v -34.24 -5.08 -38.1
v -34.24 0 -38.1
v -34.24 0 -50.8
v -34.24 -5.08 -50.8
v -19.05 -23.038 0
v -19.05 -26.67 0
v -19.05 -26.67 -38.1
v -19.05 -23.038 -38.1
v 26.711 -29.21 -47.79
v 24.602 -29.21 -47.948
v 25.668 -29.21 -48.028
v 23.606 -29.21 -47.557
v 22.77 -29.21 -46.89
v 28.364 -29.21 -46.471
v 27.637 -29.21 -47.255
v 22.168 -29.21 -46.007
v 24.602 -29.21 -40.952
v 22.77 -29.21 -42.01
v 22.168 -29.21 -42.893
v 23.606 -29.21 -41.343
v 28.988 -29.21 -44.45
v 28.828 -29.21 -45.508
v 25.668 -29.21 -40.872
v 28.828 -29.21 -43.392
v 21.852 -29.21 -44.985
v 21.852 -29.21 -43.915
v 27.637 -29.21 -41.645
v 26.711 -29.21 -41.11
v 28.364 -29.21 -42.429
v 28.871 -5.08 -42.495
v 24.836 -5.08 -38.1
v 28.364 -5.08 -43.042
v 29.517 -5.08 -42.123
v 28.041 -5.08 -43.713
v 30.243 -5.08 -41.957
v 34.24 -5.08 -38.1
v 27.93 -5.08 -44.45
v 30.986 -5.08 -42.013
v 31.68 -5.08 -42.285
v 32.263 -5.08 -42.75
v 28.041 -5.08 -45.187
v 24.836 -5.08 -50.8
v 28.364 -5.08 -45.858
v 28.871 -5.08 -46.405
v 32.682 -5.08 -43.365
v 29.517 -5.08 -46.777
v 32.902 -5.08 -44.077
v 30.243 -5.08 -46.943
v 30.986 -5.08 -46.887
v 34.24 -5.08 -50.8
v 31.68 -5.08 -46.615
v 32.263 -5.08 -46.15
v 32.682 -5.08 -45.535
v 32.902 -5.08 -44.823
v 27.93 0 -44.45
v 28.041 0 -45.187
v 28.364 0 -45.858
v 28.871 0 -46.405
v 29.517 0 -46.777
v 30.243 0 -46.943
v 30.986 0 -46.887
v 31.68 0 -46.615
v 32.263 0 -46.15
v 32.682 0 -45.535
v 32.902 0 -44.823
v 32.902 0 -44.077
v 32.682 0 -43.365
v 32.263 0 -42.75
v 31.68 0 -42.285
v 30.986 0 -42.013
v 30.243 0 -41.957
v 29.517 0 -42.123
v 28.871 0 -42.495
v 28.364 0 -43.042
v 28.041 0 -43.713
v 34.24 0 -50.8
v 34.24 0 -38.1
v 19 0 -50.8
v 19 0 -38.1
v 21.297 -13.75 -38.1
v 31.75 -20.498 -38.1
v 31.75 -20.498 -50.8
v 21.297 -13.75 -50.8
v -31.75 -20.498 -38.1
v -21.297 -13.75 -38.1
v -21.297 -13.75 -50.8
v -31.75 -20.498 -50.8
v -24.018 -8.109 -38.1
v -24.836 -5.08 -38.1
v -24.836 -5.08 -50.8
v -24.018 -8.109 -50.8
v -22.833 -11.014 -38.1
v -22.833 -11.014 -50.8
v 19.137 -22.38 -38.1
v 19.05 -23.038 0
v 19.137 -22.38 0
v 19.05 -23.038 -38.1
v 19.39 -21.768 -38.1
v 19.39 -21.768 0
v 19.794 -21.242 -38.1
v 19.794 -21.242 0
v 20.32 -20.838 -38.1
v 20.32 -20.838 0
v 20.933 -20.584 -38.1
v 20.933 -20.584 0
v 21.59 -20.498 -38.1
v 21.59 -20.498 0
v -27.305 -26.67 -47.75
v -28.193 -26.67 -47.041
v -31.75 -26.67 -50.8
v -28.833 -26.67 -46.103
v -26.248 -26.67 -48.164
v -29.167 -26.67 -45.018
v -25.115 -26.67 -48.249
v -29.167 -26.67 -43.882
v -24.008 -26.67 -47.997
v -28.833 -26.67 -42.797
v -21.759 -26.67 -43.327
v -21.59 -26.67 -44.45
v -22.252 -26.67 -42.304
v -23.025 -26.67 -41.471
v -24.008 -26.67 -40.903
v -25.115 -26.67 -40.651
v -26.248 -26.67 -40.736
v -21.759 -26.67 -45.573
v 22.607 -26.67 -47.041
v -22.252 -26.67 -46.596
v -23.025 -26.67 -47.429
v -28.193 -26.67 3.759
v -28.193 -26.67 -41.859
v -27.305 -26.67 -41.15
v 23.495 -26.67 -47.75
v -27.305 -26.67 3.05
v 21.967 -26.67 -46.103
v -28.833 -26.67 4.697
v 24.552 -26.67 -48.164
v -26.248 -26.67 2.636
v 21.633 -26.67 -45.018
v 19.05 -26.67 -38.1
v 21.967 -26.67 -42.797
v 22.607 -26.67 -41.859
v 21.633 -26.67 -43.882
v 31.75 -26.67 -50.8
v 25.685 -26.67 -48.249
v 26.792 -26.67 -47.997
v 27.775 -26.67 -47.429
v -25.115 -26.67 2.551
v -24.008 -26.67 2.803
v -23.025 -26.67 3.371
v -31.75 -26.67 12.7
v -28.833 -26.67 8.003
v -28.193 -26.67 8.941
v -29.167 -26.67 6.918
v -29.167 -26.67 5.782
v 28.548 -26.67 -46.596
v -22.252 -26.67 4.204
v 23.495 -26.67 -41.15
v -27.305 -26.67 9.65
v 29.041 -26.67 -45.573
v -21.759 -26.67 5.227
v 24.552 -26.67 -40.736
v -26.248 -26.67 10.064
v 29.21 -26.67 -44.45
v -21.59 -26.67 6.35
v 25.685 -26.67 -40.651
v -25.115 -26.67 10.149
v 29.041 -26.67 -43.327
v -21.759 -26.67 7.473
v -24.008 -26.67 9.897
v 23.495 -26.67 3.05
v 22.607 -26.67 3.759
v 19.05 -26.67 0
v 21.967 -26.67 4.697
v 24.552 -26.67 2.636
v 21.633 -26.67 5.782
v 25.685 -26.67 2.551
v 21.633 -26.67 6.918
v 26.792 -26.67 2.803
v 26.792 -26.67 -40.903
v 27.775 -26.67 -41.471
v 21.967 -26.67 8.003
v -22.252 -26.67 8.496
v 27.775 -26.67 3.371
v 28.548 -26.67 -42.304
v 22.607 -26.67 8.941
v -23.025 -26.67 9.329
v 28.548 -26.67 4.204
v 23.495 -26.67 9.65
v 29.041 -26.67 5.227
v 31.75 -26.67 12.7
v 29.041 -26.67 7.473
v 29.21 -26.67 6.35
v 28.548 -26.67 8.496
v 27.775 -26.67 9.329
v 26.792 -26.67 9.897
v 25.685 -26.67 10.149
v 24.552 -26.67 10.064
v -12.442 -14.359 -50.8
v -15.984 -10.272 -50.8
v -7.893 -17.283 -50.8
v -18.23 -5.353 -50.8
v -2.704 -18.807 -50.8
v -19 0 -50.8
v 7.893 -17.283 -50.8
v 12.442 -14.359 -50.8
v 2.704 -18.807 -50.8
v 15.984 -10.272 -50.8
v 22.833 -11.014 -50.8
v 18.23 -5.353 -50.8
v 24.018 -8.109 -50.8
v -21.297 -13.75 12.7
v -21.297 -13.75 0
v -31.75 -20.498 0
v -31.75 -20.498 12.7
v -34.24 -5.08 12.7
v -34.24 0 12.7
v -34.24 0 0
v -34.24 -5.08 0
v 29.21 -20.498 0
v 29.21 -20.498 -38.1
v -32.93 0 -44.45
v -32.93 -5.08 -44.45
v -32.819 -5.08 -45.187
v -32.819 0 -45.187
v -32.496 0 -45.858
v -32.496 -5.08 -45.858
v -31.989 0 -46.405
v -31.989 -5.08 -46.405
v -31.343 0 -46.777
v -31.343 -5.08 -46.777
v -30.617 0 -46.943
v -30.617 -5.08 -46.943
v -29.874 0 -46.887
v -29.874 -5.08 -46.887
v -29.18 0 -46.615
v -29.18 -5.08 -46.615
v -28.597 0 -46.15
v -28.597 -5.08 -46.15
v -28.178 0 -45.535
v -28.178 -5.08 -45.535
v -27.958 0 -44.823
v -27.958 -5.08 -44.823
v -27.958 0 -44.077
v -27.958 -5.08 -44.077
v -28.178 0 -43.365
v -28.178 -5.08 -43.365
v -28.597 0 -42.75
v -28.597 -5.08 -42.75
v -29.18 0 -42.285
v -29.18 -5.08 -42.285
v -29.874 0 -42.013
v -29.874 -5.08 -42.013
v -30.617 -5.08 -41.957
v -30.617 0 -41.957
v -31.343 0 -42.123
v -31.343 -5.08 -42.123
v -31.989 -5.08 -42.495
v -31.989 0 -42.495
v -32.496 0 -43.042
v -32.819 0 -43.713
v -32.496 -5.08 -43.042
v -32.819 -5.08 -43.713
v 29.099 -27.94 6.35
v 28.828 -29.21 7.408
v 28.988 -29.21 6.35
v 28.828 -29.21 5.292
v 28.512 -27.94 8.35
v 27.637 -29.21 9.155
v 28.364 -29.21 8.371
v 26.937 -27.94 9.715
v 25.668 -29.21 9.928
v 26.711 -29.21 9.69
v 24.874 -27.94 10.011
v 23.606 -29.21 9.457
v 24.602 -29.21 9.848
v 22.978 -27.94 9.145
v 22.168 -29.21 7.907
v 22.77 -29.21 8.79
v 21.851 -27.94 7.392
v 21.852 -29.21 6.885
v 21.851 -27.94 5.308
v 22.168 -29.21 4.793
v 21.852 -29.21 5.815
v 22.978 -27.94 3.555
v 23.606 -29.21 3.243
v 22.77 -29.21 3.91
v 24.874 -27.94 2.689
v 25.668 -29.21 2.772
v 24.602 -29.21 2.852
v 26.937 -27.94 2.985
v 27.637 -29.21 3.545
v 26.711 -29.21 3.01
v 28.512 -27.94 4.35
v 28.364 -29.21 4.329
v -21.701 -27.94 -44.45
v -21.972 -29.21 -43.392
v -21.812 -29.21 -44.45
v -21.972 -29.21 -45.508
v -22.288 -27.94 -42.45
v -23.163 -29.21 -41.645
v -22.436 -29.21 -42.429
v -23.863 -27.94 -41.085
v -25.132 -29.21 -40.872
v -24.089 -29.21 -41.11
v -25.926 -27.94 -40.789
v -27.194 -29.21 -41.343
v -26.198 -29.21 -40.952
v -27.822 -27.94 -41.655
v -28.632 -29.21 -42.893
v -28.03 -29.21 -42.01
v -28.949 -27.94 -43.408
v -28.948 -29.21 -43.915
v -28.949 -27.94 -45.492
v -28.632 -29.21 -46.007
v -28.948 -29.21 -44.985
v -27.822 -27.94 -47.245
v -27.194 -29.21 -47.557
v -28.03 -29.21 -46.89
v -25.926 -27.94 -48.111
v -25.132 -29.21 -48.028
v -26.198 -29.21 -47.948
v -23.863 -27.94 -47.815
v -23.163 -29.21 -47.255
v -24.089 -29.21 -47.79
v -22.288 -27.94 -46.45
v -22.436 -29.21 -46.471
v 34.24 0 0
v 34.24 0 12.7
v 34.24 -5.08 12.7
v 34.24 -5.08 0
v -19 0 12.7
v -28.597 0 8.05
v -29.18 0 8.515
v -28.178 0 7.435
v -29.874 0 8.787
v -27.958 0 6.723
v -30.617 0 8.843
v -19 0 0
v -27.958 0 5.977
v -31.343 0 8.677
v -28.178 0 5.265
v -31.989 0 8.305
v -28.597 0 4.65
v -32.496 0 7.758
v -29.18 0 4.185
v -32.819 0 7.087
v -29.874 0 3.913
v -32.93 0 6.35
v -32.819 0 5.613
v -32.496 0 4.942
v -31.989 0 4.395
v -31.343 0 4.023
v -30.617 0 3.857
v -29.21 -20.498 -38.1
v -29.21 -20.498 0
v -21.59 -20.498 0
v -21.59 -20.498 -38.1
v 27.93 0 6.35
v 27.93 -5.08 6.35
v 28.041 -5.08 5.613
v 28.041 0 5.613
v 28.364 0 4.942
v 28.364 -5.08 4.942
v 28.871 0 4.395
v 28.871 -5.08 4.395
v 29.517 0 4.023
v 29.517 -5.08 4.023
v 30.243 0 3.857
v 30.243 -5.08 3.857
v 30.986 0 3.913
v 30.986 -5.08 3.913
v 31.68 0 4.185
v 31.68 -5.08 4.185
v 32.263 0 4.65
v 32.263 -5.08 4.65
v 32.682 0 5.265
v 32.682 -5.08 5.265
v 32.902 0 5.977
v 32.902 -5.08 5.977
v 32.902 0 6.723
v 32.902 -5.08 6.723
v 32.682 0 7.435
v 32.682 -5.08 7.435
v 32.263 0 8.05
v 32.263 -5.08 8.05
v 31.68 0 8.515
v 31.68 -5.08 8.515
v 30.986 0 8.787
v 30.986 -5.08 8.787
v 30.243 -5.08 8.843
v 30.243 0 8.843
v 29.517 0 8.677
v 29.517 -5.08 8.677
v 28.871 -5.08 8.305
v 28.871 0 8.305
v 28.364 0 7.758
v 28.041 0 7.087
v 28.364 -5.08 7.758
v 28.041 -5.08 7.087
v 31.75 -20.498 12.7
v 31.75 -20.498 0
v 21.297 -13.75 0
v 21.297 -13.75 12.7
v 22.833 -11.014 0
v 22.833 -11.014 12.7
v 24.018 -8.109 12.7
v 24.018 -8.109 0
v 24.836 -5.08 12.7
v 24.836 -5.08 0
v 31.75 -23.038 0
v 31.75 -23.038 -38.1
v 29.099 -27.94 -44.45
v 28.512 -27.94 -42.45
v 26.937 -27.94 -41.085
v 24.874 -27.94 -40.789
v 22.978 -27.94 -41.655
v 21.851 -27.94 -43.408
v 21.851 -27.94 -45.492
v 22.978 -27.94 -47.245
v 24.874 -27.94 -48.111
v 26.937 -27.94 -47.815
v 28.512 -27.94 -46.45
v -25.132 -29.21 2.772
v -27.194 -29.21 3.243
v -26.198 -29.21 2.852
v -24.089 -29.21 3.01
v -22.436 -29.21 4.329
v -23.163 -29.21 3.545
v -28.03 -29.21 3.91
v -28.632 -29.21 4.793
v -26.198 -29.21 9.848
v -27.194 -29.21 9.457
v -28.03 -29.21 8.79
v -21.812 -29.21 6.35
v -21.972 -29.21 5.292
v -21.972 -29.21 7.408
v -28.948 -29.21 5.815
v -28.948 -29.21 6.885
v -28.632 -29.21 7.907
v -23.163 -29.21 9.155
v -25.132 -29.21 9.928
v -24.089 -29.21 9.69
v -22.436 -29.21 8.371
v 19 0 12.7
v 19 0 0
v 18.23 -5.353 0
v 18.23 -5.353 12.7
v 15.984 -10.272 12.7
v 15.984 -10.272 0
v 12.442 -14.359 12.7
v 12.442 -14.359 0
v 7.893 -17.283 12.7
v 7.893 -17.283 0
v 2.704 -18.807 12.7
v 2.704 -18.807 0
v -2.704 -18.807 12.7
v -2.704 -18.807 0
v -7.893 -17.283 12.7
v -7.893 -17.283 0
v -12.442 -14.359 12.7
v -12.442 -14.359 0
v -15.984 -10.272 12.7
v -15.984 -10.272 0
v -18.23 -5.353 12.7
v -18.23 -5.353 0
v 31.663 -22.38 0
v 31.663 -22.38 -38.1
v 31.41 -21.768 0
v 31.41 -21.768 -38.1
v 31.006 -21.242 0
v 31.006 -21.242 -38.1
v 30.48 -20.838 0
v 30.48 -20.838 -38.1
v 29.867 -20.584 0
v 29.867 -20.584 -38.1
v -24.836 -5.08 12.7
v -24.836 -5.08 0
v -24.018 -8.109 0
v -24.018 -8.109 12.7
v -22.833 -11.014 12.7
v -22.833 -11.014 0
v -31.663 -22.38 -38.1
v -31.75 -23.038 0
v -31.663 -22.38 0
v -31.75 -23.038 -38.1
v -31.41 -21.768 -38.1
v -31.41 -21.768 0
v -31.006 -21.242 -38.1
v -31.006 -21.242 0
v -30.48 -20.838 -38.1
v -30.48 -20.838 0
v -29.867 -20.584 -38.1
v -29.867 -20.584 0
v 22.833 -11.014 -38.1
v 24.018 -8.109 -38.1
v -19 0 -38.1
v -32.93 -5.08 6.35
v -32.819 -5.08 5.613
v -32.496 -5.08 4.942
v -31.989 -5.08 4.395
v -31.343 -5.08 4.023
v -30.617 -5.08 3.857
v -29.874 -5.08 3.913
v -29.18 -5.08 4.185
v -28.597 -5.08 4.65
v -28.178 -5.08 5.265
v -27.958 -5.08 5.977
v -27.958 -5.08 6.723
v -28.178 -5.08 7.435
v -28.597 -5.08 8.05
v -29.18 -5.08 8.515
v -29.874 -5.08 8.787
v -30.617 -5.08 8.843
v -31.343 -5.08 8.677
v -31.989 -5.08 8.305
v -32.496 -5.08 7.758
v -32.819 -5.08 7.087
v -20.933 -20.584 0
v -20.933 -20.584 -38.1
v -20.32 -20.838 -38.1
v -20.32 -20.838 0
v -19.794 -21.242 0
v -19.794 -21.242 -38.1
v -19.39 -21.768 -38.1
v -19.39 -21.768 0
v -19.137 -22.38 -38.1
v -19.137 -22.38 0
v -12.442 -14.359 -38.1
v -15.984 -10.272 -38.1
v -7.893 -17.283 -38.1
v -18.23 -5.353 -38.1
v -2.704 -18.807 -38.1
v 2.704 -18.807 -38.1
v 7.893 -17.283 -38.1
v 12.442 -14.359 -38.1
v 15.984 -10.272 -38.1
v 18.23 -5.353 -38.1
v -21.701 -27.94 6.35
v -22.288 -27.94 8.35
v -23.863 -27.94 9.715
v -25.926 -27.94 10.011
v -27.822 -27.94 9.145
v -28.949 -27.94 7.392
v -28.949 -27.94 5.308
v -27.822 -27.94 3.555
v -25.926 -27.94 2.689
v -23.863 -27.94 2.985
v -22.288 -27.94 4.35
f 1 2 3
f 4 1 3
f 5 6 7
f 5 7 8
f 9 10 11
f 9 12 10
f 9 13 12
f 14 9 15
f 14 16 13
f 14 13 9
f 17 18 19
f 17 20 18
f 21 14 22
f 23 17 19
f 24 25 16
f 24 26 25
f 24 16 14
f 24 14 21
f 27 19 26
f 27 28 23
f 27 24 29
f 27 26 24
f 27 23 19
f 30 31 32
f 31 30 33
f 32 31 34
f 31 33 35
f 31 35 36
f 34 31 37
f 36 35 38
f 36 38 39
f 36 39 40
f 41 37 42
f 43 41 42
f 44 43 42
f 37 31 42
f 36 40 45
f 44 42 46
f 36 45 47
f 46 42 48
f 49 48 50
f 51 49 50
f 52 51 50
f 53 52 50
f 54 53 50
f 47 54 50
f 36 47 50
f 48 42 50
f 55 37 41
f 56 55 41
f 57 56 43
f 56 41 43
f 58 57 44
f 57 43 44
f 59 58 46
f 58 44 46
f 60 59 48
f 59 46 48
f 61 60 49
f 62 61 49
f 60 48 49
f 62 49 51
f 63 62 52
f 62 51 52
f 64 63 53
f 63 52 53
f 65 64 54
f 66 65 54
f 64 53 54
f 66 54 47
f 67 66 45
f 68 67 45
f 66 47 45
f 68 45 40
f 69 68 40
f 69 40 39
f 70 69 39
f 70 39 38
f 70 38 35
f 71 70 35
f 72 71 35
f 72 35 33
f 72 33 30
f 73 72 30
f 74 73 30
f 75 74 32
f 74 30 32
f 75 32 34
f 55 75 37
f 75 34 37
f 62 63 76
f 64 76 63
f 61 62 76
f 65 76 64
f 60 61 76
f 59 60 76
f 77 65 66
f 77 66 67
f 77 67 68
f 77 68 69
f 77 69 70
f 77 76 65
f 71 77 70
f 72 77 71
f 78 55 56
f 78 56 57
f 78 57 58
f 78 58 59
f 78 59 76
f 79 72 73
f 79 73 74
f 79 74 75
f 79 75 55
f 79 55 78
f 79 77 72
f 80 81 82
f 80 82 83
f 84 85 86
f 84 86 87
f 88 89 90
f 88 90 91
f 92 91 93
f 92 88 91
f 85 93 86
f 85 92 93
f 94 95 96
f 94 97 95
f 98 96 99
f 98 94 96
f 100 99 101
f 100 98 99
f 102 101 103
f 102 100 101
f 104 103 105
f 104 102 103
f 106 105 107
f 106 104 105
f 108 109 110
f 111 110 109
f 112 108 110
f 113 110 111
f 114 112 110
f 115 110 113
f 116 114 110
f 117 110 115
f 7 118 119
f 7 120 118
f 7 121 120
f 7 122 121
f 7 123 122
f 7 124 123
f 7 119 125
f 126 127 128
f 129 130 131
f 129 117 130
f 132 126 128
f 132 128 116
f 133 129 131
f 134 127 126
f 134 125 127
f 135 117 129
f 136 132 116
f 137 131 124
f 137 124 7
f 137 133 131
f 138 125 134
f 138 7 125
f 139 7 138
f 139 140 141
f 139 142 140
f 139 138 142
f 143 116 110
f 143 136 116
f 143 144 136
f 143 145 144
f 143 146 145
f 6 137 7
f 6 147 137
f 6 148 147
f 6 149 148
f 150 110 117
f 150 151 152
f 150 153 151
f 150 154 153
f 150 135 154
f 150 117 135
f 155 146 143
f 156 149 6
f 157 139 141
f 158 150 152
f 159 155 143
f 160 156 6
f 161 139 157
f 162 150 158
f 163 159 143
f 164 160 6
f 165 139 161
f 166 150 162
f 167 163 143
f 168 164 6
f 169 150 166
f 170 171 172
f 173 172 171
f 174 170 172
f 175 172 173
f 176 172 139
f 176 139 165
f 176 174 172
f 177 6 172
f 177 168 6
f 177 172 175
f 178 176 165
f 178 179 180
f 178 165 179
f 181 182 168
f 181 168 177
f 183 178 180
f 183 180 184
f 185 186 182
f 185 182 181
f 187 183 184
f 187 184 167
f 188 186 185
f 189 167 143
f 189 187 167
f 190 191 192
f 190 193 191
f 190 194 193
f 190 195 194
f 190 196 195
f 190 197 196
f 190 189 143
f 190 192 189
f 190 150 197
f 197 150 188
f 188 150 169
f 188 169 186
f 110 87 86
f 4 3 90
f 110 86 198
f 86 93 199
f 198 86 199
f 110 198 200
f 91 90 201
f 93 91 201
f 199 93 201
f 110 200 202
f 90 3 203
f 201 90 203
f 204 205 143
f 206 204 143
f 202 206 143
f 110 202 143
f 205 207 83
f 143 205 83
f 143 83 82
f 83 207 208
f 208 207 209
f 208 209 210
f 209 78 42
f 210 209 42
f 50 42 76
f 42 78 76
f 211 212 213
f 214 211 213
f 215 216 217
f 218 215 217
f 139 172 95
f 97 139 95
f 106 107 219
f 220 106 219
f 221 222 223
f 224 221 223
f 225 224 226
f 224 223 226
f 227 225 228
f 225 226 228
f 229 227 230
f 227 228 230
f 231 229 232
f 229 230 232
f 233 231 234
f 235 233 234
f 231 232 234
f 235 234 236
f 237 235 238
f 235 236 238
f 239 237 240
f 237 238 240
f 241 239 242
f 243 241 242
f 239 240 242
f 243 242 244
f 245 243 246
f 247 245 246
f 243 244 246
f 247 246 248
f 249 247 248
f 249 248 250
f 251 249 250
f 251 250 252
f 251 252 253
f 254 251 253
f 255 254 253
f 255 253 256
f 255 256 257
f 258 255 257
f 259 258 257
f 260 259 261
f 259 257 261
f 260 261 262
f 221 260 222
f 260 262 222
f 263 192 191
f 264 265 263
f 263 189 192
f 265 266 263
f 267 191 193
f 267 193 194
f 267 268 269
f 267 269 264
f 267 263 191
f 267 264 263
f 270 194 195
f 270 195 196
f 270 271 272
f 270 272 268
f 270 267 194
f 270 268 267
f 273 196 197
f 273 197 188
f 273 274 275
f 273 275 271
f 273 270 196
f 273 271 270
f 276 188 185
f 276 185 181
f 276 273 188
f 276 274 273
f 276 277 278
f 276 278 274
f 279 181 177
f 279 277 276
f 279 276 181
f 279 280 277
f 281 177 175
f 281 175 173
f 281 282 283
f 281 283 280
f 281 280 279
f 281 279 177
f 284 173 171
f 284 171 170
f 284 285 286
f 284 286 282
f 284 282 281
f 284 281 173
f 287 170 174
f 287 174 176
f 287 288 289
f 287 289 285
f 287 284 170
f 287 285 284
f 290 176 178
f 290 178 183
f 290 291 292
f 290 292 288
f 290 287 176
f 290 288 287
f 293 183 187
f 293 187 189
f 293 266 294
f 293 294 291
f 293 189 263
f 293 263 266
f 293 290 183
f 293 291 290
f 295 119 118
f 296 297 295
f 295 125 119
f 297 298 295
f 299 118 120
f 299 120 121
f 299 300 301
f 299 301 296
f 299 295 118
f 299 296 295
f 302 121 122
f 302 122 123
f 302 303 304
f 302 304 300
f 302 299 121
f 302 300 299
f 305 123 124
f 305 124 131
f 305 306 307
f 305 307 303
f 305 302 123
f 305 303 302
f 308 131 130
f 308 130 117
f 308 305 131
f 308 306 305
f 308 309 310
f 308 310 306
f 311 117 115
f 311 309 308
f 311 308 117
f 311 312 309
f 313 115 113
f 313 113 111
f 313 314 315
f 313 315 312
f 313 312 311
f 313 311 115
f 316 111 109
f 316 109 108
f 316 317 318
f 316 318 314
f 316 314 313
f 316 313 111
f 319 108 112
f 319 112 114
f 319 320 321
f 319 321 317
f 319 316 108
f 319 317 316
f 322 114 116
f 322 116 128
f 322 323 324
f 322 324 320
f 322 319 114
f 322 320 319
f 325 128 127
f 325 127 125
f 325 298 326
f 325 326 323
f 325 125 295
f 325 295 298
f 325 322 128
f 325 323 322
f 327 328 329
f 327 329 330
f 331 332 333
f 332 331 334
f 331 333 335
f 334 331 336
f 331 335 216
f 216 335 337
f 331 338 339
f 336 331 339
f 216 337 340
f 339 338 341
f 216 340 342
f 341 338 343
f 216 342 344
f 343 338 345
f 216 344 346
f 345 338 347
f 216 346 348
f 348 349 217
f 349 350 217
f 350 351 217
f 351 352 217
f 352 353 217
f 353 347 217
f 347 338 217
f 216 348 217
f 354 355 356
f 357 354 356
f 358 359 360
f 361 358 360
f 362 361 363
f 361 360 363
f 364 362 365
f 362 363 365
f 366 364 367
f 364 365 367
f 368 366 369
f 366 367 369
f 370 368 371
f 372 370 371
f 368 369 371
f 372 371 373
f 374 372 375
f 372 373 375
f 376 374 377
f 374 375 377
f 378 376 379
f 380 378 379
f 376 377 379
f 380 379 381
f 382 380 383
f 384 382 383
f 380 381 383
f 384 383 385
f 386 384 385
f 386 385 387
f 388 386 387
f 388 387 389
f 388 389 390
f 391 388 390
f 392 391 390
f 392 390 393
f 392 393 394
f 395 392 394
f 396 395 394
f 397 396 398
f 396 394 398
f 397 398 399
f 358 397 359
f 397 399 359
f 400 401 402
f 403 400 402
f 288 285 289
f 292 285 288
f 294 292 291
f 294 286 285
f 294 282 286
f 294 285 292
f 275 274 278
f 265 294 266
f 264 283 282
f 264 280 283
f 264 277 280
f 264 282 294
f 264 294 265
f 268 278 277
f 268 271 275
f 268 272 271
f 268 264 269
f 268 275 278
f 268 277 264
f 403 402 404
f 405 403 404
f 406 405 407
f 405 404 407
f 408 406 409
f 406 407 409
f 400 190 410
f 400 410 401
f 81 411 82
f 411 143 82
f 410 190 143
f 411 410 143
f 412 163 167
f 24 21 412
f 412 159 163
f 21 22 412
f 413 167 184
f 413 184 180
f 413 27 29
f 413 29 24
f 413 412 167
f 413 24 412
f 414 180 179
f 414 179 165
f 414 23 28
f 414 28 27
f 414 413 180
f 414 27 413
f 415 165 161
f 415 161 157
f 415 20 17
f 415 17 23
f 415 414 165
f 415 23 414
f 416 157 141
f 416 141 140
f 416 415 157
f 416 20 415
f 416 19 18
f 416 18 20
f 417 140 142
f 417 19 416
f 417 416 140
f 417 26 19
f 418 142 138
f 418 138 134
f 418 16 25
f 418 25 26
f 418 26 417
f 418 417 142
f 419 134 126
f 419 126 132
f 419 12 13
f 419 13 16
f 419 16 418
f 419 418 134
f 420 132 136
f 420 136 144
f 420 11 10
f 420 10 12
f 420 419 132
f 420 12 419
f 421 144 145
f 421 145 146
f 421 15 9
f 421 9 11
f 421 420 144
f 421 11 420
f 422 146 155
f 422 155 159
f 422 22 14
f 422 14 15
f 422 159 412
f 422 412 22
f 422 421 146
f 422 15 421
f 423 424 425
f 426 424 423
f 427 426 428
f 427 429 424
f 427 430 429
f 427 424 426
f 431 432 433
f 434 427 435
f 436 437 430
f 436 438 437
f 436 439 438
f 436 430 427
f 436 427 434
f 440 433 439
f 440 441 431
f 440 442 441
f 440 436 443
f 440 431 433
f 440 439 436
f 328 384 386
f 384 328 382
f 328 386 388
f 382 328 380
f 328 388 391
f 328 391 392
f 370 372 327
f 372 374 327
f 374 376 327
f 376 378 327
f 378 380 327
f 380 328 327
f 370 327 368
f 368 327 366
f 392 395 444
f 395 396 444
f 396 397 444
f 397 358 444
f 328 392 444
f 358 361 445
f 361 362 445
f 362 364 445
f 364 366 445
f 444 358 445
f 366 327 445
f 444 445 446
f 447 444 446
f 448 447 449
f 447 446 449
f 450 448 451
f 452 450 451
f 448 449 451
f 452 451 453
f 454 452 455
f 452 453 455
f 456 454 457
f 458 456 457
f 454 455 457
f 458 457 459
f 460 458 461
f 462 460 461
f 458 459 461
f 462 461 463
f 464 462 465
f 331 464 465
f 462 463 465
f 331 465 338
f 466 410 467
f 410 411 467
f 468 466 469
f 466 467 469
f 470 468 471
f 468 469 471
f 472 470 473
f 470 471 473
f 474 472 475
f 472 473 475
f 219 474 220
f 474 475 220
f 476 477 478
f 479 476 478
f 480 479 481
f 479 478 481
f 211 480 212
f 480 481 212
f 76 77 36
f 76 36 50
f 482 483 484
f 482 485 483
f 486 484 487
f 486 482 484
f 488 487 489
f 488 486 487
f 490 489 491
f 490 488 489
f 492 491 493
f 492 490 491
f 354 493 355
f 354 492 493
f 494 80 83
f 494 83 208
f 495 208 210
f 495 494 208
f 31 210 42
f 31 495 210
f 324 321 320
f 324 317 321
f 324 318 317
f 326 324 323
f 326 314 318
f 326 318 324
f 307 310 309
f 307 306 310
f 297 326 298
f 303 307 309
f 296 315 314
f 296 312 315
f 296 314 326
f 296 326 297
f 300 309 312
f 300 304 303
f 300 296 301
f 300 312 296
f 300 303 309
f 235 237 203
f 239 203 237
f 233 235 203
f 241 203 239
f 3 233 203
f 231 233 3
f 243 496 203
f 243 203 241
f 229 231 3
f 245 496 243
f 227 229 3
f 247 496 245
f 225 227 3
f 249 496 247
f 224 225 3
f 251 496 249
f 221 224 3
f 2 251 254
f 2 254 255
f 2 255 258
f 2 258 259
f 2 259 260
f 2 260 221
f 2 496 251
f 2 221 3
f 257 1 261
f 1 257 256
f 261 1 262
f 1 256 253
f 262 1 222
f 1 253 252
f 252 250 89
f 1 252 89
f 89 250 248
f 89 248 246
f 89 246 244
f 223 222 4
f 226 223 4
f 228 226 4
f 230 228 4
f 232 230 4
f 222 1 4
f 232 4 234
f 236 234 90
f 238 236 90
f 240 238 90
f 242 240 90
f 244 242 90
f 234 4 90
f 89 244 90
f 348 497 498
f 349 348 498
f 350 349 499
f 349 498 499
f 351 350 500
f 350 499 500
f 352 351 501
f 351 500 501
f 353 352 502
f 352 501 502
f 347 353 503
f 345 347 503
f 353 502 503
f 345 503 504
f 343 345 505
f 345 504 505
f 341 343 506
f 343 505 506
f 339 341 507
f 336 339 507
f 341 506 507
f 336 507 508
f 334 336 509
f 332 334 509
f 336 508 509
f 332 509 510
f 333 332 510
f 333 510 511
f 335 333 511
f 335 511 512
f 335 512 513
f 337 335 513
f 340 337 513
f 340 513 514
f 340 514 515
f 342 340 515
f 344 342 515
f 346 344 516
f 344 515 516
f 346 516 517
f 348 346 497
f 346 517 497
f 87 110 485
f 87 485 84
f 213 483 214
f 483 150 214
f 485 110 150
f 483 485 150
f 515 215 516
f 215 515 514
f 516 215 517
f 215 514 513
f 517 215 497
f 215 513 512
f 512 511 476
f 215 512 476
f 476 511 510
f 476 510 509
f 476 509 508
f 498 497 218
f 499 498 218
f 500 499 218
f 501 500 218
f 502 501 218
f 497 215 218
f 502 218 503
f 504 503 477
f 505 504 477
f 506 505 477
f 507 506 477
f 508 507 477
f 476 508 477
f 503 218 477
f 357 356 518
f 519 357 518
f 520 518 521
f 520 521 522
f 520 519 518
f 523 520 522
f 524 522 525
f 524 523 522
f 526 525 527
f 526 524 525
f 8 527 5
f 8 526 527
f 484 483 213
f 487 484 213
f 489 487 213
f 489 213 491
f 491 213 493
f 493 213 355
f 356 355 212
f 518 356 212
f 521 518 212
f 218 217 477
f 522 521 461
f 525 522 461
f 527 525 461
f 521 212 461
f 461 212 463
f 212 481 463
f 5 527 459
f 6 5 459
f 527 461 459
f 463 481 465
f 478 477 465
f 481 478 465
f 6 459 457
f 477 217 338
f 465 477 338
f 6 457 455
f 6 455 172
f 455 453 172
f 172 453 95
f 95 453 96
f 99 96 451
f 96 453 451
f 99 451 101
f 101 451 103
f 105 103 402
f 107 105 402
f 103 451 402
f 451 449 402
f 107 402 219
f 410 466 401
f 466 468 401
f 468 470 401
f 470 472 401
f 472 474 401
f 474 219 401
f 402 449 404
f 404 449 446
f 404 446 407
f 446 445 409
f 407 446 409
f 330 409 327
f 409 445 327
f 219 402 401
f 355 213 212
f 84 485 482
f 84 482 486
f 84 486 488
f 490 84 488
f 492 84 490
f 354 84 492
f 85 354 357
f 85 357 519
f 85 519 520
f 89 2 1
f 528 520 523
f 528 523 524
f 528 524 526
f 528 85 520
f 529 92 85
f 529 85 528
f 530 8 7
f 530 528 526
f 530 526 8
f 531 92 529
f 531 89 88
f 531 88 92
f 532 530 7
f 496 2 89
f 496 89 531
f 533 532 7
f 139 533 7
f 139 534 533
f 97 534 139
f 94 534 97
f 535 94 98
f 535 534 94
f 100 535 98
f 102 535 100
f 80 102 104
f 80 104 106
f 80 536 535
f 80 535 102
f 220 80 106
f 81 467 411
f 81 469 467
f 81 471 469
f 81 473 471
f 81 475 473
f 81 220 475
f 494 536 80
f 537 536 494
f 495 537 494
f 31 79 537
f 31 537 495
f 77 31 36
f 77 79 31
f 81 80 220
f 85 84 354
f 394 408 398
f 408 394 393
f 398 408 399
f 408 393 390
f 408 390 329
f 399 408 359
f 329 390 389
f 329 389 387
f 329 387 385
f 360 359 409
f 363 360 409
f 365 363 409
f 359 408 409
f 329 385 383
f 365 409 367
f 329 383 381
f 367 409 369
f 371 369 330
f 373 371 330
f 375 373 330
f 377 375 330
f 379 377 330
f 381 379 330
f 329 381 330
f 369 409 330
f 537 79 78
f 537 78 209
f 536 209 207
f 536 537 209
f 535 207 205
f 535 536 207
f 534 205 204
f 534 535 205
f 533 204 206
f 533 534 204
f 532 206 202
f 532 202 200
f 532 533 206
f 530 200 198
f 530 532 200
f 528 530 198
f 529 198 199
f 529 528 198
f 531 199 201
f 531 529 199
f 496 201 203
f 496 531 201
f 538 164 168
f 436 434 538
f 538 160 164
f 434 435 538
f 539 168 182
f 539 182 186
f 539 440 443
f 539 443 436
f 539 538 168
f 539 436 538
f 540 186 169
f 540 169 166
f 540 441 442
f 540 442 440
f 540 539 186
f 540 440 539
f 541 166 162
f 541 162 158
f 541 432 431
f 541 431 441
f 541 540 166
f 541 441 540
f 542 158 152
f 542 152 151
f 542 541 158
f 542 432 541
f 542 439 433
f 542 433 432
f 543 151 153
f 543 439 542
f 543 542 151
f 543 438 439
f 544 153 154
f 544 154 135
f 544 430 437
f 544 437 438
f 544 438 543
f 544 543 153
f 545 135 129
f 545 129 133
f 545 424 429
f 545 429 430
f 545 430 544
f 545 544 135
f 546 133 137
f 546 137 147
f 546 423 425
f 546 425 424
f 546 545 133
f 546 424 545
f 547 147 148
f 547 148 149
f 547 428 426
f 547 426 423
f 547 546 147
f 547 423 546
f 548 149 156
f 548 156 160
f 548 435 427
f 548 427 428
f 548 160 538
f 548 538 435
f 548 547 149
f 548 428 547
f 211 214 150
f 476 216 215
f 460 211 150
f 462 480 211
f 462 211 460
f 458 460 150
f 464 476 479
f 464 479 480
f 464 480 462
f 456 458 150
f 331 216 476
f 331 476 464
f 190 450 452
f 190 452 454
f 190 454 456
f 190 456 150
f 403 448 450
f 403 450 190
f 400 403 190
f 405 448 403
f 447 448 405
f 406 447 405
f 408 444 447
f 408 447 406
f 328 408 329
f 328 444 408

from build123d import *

# Parameters (mm, degrees)
BOSS_EXTRUDE1_DEPTH           = 12.7
SKETCH3_R                     = 3.81
BOSS_EXTRUDE2_DEPTH           = 2.54
BOSS_EXTRUDE2_DRAFT           = 5
BOSS_EXTRUDE2_PROFILE_2_DEPTH = 2.54
BOSS_EXTRUDE2_PROFILE_2_DRAFT = 5
BOSS_EXTRUDE3_START           = -38.1
BOSS_EXTRUDE3_DEPTH           = 12.7
SKETCH6_R                     = 3.81
BOSS_EXTRUDE4_DEPTH           = 2.54
BOSS_EXTRUDE4_DRAFT           = 5
BOSS_EXTRUDE4_PROFILE_2_DEPTH = 2.54
BOSS_EXTRUDE4_PROFILE_2_DRAFT = 5
BOSS_EXTRUDE5_REACH           = 78.769
SKETCH7_W                     = 12.7
SKETCH7_H                     = 6.172188314
SKETCH8_W                     = 15.24
SKETCH8_H                     = 12.7
BOSS_EXTRUDE6_DEPTH           = 5.08
SKETCH9_R                     = 2.5
CUT_EXTRUDE3_DEPTH            = 5.08
FILLET6_R                     = 2.54


with BuildPart() as part:
    # Sketch2 → Boss-Extrude1 (new body)
    with BuildSketch(Plane.XY):
        with BuildLine():
            Line((-31.75, -26.67), (31.75, -26.67))
            Line((31.75, -26.67), (31.75, -20.497811686))
            Line((31.75, -20.497811686), (21.297259116, -13.749518324))
            ThreePointArc((21.297259116, -13.749518324), (24.315715274, -7.167181503), (25.35, 0))
            Line((25.35, 0), (19, 0))
            ThreePointArc((19, 0), (0, -19), (-19, 0))
            Line((-19, 0), (-25.35, 0))
            ThreePointArc((-25.35, 0), (-24.315715274, -7.167181503), (-21.297259116, -13.749518324))
            Line((-21.297259116, -13.749518324), (-31.75, -20.497811686))
            Line((-31.75, -20.497811686), (-31.75, -26.67))
        make_face()
    extrude(amount=BOSS_EXTRUDE1_DEPTH)


with BuildPart() as boss_extrude2_tool:
    # Sketch3 → Boss-Extrude2 (with draft: the straight prism first)
    with BuildSketch(Plane.XZ.offset(26.67)):
        with Locations((-25.4, 6.35)):
            Circle(SKETCH3_R)
    extrude(amount=BOSS_EXTRUDE2_DEPTH)
    # Boss-Extrude2: the draft: its side faces are tilted about the plane it starts from
    boss_extrude2_sides = [boss_extrude2_tool.faces().sort_by_distance(p)[0] for p in [
        (-29.21, -27.94, 6.35),
    ]]
    draft(boss_extrude2_sides, Plane.XZ.offset(26.67), BOSS_EXTRUDE2_DRAFT)


with BuildPart() as part_1:
    add(part.part)

    # Boss-Extrude2: add boss_extrude2_tool
    add(boss_extrude2_tool.part)


with BuildPart() as boss_extrude2_profile_2_tool:
    # Sketch3 → Boss-Extrude2 profile 2 (with draft: the straight prism first)
    with BuildSketch(Plane.XZ.offset(26.67)):
        with Locations((25.4, 6.35)):
            Circle(SKETCH3_R)
    extrude(amount=BOSS_EXTRUDE2_PROFILE_2_DEPTH)
    # Boss-Extrude2 profile 2: the draft: its side faces are tilted about the plane it starts from
    boss_extrude2_profile_2_sides = [boss_extrude2_profile_2_tool.faces().sort_by_distance(p)[0] for p in [
        (21.59, -27.94, 6.35),
    ]]
    draft(boss_extrude2_profile_2_sides, Plane.XZ.offset(26.67), BOSS_EXTRUDE2_PROFILE_2_DRAFT)


with BuildPart() as part_2:
    add(part_1.part)

    # Boss-Extrude2 profile 2: add boss_extrude2_profile_2_tool
    add(boss_extrude2_profile_2_tool.part)


with BuildPart() as body_2:
    # Sketch2<2> → Boss-Extrude3 (new body)
    with BuildSketch(Plane.XY.offset(BOSS_EXTRUDE3_START)):
        with BuildLine():
            Line((-31.75, -26.67), (31.75, -26.67))
            Line((31.75, -26.67), (31.75, -20.497811686))
            Line((31.75, -20.497811686), (21.297259116, -13.749518324))
            ThreePointArc((21.297259116, -13.749518324), (24.315715274, -7.167181503), (25.35, 0))
            Line((25.35, 0), (19, 0))
            ThreePointArc((19, 0), (0, -19), (-19, 0))
            Line((-19, 0), (-25.35, 0))
            ThreePointArc((-25.35, 0), (-24.315715274, -7.167181503), (-21.297259116, -13.749518324))
            Line((-21.297259116, -13.749518324), (-31.75, -20.497811686))
            Line((-31.75, -20.497811686), (-31.75, -26.67))
        make_face()
    extrude(amount=-BOSS_EXTRUDE3_DEPTH)


with BuildPart() as boss_extrude4_tool:
    # Sketch6 → Boss-Extrude4 (with draft: the straight prism first)
    with BuildSketch(Plane.XZ.offset(26.67)):
        with Locations((-25.4, -44.45)):
            Circle(SKETCH6_R)
    extrude(amount=BOSS_EXTRUDE4_DEPTH)
    # Boss-Extrude4: the draft: its side faces are tilted about the plane it starts from
    boss_extrude4_sides = [boss_extrude4_tool.faces().sort_by_distance(p)[0] for p in [
        (-29.21, -27.94, -44.45),
    ]]
    draft(boss_extrude4_sides, Plane.XZ.offset(26.67), BOSS_EXTRUDE4_DRAFT)


with BuildPart() as body_2_1:
    add(body_2.part)

    # Boss-Extrude4: add boss_extrude4_tool
    add(boss_extrude4_tool.part)


with BuildPart() as boss_extrude4_profile_2_tool:
    # Sketch6 → Boss-Extrude4 profile 2 (with draft: the straight prism first)
    with BuildSketch(Plane.XZ.offset(26.67)):
        with Locations((25.4, -44.45)):
            Circle(SKETCH6_R)
    extrude(amount=BOSS_EXTRUDE4_PROFILE_2_DEPTH)
    # Boss-Extrude4 profile 2: the draft: its side faces are tilted about the plane it starts from
    boss_extrude4_profile_2_sides = [boss_extrude4_profile_2_tool.faces().sort_by_distance(p)[0] for p in [
        (21.59, -27.94, -44.45),
    ]]
    draft(boss_extrude4_profile_2_sides, Plane.XZ.offset(26.67), BOSS_EXTRUDE4_PROFILE_2_DRAFT)


with BuildPart() as body_2_2:
    add(body_2_1.part)

    # Boss-Extrude4 profile 2: add boss_extrude4_profile_2_tool
    add(boss_extrude4_profile_2_tool.part)

    # Sketch7 → Boss-Extrude5 (add, up to next)
    with BuildSketch(Plane.XY.offset(12.7), mode=Mode.PRIVATE) as boss_extrude5_sk1:
        with Locations((-25.4, -23.583905843)):
            Rectangle(SKETCH7_W, SKETCH7_H)
    boss_extrude5_tool1 = extrude(boss_extrude5_sk1.sketch, amount=-BOSS_EXTRUDE5_REACH, mode=Mode.PRIVATE) - body_2_2.part
    # Sketch7 → Boss-Extrude5 (add, up to next)
    with BuildSketch(Plane.XY.offset(12.7), mode=Mode.PRIVATE) as boss_extrude5_sk2:
        with Locations((25.4, -23.583905843)):
            Rectangle(SKETCH7_W, SKETCH7_H)
    boss_extrude5_tool2 = extrude(boss_extrude5_sk2.sketch, amount=-BOSS_EXTRUDE5_REACH, mode=Mode.PRIVATE) - body_2_2.part

    add(part_2.part)  # Boss-Extrude5 merges part
    add(boss_extrude5_tool1.solids().sort_by_distance((-25.4, -23.583906, 12.7))[0])
    add(boss_extrude5_tool2.solids().sort_by_distance((25.4, -23.583906, 12.7))[0])

    # Sketch8 → Boss-Extrude6 (add)
    with BuildSketch(Plane(origin=(0, 0, 0), x_dir=(1, 0, 0), z_dir=(0, 1, 0))):
        with Locations((26.62, -6.35)):
            Rectangle(SKETCH8_W, SKETCH8_H)
        with Locations((-26.62, 44.45)):
            Rectangle(SKETCH8_W, SKETCH8_H)
        with Locations((26.62, 44.45)):
            Rectangle(SKETCH8_W, SKETCH8_H)
        with Locations((-26.62, -6.35)):
            Rectangle(SKETCH8_W, SKETCH8_H)
    extrude(amount=-BOSS_EXTRUDE6_DEPTH)

    # Sketch9 → Cut-Extrude3 (cut)
    with BuildSketch(Plane(origin=(0, -5.08, 0), x_dir=(-1, 0, 0), z_dir=(0, -1, 0))):
        with Locations((30.43, 44.45)):
            Circle(SKETCH9_R)
        with Locations((-30.43, 44.45)):
            Circle(SKETCH9_R)
        with Locations((-30.43, -6.35)):
            Circle(SKETCH9_R)
        with Locations((30.43, -6.35)):
            Circle(SKETCH9_R)
    extrude(amount=-CUT_EXTRUDE3_DEPTH, mode=Mode.SUBTRACT)

    # Fillet6
    fillet6_edges = [body_2_2.edges().sort_by_distance(p)[0] for p in [
        (31.75, -20.497811686, -19.05),
        (19.05, -20.497811686, -19.05),
        (-19.05, -20.497811686, -19.05),
        (-31.75, -20.497811686, -19.05),
    ]]
    fillet(fillet6_edges, radius=FILLET6_R)


solid = body_2_2.part
